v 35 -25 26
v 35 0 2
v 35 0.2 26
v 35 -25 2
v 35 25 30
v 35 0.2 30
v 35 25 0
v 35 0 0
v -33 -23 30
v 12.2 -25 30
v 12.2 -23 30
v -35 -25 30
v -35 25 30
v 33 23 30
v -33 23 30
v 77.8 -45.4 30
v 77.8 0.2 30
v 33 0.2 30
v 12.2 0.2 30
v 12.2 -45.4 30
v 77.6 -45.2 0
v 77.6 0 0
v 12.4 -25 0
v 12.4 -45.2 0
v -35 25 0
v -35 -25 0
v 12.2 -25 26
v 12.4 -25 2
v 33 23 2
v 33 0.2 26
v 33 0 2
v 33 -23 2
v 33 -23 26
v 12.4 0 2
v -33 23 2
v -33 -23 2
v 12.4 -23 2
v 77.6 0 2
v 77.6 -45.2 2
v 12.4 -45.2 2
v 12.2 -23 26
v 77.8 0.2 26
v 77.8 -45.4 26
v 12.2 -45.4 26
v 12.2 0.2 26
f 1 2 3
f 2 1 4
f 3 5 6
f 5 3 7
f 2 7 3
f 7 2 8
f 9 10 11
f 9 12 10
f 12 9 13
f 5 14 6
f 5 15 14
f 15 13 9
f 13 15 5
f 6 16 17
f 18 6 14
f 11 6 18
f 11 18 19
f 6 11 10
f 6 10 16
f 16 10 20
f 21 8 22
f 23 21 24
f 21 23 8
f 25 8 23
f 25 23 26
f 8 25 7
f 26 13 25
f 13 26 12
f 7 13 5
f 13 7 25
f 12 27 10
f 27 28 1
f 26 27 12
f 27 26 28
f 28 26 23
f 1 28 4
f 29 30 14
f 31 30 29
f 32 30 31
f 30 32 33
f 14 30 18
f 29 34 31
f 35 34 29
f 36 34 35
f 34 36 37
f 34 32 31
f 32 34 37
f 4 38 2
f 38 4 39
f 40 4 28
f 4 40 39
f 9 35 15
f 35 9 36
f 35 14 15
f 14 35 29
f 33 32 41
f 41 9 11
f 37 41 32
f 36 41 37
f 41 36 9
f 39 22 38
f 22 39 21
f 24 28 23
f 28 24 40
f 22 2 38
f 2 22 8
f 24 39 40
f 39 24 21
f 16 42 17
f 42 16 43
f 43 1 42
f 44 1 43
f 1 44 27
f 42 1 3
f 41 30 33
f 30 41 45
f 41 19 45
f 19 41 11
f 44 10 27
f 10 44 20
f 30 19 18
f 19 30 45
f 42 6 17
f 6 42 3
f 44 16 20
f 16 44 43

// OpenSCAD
// Two-part enclosure for small electronics board (e.g., Arduino-based logger)
// Print orientation: both parts flat on the bed, side by side along X.
// The lid is printed upside down so its lip overlaps the box opening.

// ---------------- Parameters ----------------
box_x      = 70;    // box outer length along X (mm)
box_y      = 50;    // box outer width along Y (mm)
box_z      = 30;    // box height along Z (mm)
box_wall   = 2;     // box wall thickness (mm)
box_floor  = 2;     // box floor thickness (mm)

lip_w      = 65.6;  // lid lip outer length along X (mm)
lip_d      = 45.6;  // lid lip outer width along Y (mm)
lip_h      = 4;     // lid lip height above plate (mm)
lip_t      = 1.5;   // lid lip wall thickness (mm)

gap        = 10;    // clear gap between box and lid (mm)

// ---------------- Derived ----------------
inner_x = box_x - 2 * box_wall;   // 66 mm
inner_y = box_y - 2 * box_wall;   // 46 mm
// Lip outer size minus clearance = plate size (0.2 mm clearance each side)
plate_x = lip_w - 0.4;            // 65.2 mm
plate_y = lip_d - 0.4;            // 45.2 mm
plate_z = box_z - lip_h;          // 26 mm (top of plate)

// ---------------- Modules ----------------
module box() {
    difference() {
        translate([0, 0, 0])
            cube([box_x, box_y, box_z]);
        // Open-top cavity, walls and floor exactly as specified
        translate([box_wall, box_wall, box_floor])
            cube([inner_x, inner_y, box_z - box_floor]);
    }
}

module lid() {
    union() {
        // Base plate, 2 mm thick, centred on origin in X/Y
        translate([-plate_x / 2, -plate_y / 2, 0])
            cube([plate_x, plate_y, 2]);

        // Rectangular lip on top of the plate
        translate([-lip_w / 2, -lip_d / 2, plate_z])
            cube([lip_w, lip_d, lip_h]);
    }
}

// ---------------- Assembly ----------------
// Box centred on origin in X/Y, resting on z = 0
translate([-box_x / 2, -box_y / 2, 0])
    box();

// Lid placed on the +X side, with the specified gap
translate([box_x / 2 + gap, -plate_y / 2, 0])
    lid();
